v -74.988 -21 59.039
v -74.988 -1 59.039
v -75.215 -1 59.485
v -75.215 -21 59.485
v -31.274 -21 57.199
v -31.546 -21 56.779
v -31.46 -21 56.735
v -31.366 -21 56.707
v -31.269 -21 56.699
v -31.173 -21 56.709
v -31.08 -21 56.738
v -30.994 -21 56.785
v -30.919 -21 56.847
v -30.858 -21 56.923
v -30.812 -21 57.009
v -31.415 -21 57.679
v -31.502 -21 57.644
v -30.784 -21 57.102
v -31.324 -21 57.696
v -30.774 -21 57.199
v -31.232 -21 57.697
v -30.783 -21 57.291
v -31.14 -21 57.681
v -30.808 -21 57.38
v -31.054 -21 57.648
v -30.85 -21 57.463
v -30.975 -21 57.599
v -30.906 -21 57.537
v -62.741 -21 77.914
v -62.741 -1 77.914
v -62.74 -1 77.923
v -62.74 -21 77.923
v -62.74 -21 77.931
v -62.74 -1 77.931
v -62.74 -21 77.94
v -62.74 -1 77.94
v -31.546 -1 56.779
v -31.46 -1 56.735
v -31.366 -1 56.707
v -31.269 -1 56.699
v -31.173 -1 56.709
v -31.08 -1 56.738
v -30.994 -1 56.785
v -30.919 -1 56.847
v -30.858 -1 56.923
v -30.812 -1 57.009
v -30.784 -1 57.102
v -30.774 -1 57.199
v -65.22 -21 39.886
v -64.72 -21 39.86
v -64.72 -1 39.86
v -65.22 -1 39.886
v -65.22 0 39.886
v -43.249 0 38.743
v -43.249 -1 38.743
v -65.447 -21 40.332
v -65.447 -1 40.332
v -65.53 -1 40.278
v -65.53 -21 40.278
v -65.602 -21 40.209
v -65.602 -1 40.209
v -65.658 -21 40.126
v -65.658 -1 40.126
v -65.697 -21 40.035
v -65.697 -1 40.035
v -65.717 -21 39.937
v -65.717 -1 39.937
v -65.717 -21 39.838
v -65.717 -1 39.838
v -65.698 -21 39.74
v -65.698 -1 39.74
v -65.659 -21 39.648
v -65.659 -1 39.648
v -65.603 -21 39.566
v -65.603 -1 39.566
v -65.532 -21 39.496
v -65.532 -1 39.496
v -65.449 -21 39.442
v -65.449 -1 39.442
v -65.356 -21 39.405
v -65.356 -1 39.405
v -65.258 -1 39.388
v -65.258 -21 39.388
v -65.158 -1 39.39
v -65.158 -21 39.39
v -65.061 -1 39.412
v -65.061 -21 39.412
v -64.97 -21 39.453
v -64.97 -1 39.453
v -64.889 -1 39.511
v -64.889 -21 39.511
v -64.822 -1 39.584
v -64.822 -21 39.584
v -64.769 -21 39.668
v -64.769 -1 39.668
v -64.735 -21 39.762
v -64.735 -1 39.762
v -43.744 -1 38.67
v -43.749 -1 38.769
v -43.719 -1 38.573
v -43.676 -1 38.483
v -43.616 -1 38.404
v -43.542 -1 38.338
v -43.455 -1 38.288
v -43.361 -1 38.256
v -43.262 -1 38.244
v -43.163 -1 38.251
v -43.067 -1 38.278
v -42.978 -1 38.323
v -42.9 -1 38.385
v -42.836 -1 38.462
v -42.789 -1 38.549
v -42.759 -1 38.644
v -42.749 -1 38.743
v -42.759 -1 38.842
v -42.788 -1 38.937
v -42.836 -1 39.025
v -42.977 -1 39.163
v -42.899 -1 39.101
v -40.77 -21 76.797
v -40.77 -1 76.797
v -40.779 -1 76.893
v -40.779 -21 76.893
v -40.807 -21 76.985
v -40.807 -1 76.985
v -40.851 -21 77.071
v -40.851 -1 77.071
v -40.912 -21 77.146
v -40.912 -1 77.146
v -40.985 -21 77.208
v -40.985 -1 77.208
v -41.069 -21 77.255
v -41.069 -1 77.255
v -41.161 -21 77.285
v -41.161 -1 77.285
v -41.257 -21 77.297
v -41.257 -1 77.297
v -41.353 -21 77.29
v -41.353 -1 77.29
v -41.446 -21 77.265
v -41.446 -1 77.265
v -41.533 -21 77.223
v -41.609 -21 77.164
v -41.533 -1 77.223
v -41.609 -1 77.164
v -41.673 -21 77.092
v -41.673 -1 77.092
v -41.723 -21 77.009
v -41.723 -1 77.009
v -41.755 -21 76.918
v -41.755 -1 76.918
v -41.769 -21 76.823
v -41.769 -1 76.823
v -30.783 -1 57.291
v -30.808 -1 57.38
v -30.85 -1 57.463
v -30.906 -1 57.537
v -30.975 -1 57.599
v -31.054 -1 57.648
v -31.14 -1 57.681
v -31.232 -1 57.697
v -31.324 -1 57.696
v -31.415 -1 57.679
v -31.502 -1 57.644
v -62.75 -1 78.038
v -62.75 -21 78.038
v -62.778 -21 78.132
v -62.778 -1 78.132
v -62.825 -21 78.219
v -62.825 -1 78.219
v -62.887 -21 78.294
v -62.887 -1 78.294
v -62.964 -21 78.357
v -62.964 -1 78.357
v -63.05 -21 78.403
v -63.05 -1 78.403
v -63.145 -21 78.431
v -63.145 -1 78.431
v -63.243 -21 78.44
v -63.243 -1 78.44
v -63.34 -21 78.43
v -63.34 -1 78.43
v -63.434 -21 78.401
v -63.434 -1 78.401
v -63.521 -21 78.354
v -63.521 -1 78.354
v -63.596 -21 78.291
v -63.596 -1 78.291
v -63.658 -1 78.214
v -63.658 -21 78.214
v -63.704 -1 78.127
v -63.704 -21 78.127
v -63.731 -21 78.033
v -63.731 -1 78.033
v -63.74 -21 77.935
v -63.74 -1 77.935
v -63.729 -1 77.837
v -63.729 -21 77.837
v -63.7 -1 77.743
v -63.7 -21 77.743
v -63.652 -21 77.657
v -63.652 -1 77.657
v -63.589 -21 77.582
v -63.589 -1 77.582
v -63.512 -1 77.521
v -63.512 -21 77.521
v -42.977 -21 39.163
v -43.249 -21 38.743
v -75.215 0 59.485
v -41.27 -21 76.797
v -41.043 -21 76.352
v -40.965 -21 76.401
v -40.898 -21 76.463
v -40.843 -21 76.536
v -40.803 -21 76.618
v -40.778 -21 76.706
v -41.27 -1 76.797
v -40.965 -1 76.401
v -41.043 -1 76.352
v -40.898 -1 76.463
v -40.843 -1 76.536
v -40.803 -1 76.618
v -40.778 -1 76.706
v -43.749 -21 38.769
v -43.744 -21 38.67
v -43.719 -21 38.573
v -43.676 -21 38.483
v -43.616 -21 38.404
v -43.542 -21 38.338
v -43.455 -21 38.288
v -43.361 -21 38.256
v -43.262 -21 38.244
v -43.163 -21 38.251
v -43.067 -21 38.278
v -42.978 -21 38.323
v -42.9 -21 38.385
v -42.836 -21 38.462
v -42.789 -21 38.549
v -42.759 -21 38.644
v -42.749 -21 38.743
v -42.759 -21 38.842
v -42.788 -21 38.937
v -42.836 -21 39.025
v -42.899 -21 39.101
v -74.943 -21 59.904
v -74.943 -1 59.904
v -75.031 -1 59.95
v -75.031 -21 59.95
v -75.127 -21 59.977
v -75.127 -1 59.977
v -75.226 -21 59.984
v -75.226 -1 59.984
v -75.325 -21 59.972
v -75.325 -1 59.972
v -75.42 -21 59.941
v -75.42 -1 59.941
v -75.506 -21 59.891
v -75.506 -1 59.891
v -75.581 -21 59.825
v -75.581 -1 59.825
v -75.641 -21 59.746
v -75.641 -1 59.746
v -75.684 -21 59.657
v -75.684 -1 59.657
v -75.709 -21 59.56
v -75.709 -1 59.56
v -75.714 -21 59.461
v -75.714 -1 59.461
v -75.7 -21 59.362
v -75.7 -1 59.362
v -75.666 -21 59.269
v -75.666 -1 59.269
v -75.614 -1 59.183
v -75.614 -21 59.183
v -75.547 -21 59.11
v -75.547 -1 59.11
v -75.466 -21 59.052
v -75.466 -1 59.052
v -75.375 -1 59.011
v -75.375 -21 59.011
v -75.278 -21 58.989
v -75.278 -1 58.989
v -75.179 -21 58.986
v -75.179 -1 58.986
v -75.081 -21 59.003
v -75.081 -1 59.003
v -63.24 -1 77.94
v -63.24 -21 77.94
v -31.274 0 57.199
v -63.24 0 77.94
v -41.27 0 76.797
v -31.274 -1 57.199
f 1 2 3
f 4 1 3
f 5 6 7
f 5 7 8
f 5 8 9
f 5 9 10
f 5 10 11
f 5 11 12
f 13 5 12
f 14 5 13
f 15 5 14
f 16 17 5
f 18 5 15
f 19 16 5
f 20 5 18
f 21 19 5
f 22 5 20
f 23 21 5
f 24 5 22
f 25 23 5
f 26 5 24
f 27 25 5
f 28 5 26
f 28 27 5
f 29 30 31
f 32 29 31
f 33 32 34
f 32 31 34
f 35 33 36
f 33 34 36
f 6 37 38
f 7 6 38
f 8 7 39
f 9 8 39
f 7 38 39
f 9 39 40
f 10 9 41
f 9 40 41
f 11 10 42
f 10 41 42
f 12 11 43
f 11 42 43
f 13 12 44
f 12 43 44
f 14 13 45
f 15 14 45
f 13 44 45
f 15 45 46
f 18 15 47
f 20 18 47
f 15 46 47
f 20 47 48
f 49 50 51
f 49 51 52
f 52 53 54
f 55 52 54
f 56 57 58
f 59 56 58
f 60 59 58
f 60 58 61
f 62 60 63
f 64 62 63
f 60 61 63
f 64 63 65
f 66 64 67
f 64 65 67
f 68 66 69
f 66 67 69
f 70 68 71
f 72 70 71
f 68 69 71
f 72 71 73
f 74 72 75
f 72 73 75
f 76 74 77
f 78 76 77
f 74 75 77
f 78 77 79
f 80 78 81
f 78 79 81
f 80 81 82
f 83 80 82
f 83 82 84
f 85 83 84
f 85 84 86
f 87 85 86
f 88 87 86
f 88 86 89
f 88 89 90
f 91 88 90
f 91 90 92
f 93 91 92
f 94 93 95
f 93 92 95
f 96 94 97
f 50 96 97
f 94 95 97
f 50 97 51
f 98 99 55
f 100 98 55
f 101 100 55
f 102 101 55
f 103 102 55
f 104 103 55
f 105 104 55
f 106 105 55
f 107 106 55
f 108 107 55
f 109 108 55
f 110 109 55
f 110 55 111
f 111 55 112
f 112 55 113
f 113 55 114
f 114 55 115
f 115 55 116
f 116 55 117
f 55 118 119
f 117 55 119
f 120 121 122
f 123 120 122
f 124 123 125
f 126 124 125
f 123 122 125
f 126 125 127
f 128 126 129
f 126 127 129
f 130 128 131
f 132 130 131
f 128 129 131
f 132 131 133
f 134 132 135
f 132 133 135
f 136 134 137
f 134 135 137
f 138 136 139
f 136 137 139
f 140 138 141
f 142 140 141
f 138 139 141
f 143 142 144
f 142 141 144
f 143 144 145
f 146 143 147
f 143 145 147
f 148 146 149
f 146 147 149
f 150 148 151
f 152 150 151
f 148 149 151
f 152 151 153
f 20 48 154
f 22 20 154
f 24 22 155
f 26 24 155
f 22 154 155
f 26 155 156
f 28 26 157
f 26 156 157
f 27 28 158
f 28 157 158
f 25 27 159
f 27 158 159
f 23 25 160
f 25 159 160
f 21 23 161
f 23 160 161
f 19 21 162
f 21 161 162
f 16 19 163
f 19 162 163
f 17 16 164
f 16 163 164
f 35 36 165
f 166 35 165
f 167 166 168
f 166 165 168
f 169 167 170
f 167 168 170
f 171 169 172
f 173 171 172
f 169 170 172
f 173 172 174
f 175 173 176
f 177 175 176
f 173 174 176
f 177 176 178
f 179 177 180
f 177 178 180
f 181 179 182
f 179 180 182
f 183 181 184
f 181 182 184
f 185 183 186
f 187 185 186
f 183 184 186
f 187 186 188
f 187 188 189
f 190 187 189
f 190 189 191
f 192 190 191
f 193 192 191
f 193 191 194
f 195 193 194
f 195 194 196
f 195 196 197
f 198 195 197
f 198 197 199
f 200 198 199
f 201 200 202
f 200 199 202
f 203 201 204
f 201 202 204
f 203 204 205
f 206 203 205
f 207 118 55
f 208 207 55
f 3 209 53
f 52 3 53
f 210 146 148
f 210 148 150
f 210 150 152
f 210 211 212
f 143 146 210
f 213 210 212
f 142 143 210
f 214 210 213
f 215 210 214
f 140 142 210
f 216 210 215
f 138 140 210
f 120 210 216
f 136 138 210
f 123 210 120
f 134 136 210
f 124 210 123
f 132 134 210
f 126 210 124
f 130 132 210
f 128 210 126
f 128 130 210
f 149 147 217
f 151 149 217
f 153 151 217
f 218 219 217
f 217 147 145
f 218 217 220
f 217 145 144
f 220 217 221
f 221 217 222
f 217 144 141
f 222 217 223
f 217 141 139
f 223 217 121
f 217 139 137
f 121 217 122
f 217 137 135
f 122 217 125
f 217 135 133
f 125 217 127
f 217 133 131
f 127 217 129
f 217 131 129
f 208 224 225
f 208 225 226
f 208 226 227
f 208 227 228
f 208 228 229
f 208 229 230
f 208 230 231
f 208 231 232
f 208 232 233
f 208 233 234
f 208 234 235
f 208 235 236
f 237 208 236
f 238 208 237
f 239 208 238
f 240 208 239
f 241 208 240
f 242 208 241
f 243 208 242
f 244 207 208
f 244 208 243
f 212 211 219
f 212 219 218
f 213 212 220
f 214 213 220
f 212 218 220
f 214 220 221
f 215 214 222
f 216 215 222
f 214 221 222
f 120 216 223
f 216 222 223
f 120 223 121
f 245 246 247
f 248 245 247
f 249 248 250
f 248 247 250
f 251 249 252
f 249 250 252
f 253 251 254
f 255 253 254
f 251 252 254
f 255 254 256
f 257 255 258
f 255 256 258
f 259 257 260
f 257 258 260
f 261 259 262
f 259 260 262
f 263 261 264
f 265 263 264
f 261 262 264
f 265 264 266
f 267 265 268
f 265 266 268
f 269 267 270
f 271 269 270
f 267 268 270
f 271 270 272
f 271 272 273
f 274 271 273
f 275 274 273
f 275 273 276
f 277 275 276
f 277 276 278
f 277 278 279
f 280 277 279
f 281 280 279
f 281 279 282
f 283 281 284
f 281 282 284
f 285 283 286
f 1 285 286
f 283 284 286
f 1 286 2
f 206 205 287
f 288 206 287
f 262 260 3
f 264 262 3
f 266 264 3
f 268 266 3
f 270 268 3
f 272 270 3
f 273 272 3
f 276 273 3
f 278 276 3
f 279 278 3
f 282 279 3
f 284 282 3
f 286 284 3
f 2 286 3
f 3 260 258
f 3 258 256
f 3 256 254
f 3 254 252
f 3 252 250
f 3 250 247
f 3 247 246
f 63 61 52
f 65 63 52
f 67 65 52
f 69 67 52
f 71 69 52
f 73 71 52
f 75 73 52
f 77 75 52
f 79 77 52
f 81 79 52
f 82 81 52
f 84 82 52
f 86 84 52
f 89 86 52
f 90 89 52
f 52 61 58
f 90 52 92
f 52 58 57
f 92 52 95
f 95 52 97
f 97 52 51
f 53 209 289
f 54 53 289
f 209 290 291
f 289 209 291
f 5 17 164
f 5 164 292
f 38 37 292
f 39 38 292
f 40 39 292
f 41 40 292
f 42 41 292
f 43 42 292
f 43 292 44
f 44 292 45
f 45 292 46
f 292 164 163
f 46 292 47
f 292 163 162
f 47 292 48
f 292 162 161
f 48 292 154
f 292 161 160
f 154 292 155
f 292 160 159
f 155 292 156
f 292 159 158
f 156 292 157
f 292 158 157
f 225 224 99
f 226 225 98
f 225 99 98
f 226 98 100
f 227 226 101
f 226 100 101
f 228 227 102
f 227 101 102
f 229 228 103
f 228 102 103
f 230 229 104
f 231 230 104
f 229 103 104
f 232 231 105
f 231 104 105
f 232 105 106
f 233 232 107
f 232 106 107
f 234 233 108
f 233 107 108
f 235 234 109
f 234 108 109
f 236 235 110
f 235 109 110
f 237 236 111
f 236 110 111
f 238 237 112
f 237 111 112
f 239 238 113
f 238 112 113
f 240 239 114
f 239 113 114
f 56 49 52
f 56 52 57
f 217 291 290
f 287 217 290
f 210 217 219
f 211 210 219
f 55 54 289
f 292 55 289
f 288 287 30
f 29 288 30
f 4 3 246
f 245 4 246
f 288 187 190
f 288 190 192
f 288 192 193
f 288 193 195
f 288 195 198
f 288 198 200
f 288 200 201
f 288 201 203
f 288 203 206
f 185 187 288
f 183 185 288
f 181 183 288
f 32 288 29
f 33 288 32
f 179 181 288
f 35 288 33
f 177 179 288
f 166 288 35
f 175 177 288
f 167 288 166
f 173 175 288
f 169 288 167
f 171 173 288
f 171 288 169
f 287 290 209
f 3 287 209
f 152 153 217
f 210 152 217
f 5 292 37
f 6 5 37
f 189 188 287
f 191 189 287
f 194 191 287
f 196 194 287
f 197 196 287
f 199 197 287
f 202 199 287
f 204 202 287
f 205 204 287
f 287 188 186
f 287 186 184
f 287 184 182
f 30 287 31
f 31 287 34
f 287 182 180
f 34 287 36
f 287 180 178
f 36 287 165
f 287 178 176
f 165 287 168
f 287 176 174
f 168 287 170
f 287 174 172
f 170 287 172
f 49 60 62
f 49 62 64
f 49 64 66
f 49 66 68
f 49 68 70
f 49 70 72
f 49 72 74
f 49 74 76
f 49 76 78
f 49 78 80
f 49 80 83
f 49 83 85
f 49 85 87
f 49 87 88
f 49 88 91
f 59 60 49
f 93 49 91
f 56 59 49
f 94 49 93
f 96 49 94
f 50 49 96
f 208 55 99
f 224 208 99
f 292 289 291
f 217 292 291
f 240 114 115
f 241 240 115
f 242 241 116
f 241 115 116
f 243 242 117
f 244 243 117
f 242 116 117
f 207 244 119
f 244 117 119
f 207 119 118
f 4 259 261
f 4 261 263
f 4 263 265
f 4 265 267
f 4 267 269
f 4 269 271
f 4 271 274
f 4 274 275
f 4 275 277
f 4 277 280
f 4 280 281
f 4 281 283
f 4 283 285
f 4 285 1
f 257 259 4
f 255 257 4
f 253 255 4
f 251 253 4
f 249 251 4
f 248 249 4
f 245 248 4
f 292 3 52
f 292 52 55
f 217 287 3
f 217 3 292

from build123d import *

# Parameters (mm, degrees)
F1_DEPTH = 1
F3_DEPTH = 20


with BuildPart() as f1:
    # F0 (on Front) → F1 (new body)
    with BuildSketch(Plane.XZ):
        Polygon((-43.2492189092, 38.7434536126), (-31.2743358982, 57.1988641167), (-41.2697487264, 76.7971222636), (-63.2400445657, 77.9399699065), (-75.2149275767, 59.4845594025), (-65.2195147485, 39.8863012555), align=None)
    extrude(amount=F1_DEPTH)


with BuildPart() as f3:
    # F2 (on face) → F3 (new body)
    with BuildSketch(Plane.XZ.offset(1)):
        with BuildLine():
            ThreePointArc((-62.7407196603, 77.9139960964), (-62.7402133678, 77.9269786155), (-62.7400445657, 77.9399699065))
            ThreePointArc((-62.7400445657, 77.9399699065), (-63.4787093766, 78.3793320669), (-63.5122009978, 77.5205287587))
            Line((-63.5122009978, 77.5205287587), (-63.2400445657, 77.9399699065))
            Line((-63.2400445657, 77.9399699065), (-62.7407196603, 77.9139960964))
        make_face()
    extrude(amount=F3_DEPTH)


with BuildPart() as f3b:
    # F2 (on face) → F3, piece 2 (new body)
    with BuildSketch(Plane.XZ.offset(1)):
        with BuildLine():
            ThreePointArc((-40.7697487264, 76.7971222636), (-41.2567574355, 77.2969534615), (-41.7690736319, 76.8230960737))
            Line((-41.7690736319, 76.8230960737), (-41.2697487264, 76.7971222636))
            Line((-41.2697487264, 76.7971222636), (-41.0425802531, 76.3517073057))
            ThreePointArc((-41.0425802531, 76.3517073057), (-40.8433778569, 76.5359558767), (-40.7697487264, 76.7971222636))
        make_face()
    extrude(amount=F3_DEPTH)


with BuildPart() as f3c:
    # F2 (on face) → F3, piece 3 (new body)
    with BuildSketch(Plane.XZ.offset(1)):
        with BuildLine():
            ThreePointArc((-30.7743358982, 57.1988641167), (-31.0131695113, 57.6252349861), (-31.5015043716, 57.6442790746))
            Line((-31.5015043716, 57.6442790746), (-31.2743358982, 57.1988641167))
            Line((-31.2743358982, 57.1988641167), (-31.5464923303, 56.7794229688))
            ThreePointArc((-31.5464923303, 56.7794229688), (-31.0356710873, 56.7595019562), (-30.7743358982, 57.1988641167))
        make_face()
    extrude(amount=F3_DEPTH)


with BuildPart() as f3d:
    # F2 (on face) → F3, piece 4 (new body)
    with BuildSketch(Plane.XZ.offset(1)):
        with BuildLine():
            Line((-43.2492189092, 38.7434536126), (-43.7485438147, 38.7694274227))
            ThreePointArc((-43.7485438147, 38.7694274227), (-43.2622102002, 38.2436224148), (-42.7492189092, 38.7434536126))
            ThreePointArc((-42.7492189092, 38.7434536126), (-42.8098567488, 38.9821184236), (-42.9770624772, 39.1628947605))
            Line((-42.9770624772, 39.1628947605), (-43.2492189092, 38.7434536126))
        make_face()
    extrude(amount=F3_DEPTH)


with BuildPart() as f3e:
    # F2 (on face) → F3, piece 5 (new body)
    with BuildSketch(Plane.XZ.offset(1)):
        with BuildLine():
            Line((-65.2195147485, 39.8863012555), (-65.4466832219, 40.3317162134))
            ThreePointArc((-65.4466832219, 40.3317162134), (-65.4916711806, 39.4668601077), (-64.7201898431, 39.8603274455))
            Line((-64.7201898431, 39.8603274455), (-65.2195147485, 39.8863012555))
        make_face()
    extrude(amount=F3_DEPTH)


with BuildPart() as f3f:
    # F2 (on face) → F3, piece 6 (new body)
    with BuildSketch(Plane.XZ.offset(1)):
        with BuildLine():
            Line((-75.2149275767, 59.4845594025), (-74.9427711447, 59.9040005503))
            ThreePointArc((-74.9427711447, 59.9040005503), (-75.7142524822, 59.5105332125), (-74.9877591034, 59.0391444446))
            Line((-74.9877591034, 59.0391444446), (-75.2149275767, 59.4845594025))
        make_face()
    extrude(amount=F3_DEPTH)


solid = Compound([f1.part, f3.part, f3b.part, f3c.part, f3d.part, f3e.part, f3f.part])
